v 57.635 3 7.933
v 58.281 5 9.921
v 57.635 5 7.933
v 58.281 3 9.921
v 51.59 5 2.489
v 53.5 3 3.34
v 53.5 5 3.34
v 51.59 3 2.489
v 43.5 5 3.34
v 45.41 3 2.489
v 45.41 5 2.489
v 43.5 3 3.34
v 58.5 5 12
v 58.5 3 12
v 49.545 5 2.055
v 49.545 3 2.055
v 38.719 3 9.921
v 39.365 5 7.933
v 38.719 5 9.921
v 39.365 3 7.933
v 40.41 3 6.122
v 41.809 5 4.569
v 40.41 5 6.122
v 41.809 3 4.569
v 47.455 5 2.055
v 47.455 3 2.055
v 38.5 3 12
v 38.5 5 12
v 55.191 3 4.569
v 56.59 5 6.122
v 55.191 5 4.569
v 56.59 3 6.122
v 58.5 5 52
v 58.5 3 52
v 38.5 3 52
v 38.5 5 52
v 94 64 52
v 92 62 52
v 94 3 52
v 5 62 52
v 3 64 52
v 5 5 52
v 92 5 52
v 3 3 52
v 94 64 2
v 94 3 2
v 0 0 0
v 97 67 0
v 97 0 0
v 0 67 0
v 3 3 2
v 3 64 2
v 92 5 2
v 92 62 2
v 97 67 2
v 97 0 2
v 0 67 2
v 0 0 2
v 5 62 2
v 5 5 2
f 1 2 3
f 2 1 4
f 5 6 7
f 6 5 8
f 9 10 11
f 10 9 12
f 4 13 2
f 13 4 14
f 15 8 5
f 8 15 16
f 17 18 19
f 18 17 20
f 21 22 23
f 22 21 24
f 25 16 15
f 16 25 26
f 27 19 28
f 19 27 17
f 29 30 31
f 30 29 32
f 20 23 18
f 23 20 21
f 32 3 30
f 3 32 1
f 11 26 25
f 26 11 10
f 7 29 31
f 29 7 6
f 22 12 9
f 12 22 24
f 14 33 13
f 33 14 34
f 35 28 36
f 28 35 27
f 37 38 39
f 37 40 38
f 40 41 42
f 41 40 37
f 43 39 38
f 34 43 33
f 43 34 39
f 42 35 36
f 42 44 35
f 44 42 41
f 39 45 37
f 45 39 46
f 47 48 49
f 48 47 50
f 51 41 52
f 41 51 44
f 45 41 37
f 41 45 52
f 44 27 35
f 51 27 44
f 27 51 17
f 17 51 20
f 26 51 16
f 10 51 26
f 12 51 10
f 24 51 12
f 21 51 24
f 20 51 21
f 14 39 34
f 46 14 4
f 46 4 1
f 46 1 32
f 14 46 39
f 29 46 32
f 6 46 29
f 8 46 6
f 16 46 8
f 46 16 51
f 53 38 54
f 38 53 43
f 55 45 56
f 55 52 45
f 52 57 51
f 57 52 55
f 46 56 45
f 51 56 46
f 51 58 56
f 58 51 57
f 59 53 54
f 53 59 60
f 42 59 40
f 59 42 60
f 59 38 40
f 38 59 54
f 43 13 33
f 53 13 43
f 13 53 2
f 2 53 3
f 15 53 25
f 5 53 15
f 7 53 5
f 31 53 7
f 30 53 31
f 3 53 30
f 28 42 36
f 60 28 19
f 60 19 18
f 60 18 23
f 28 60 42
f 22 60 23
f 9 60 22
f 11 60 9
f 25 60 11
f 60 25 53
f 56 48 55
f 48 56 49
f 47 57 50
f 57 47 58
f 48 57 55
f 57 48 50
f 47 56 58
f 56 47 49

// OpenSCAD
thickness = 2;

paper_width = 57;
paper_length = 87;

box_height = 50;

slit = true;
slit_width = 20;

base_width = 67;
base_length = 97;
base_height = 2;

box_length = paper_length + thickness * 2; 
box_width = paper_width + thickness * 2;

module slit(){
	translate([0, slit_width/2, 0]) cylinder(d=slit_width, h=thickness*3, center=false);
	translate([-slit_width/2, slit_width/2, 0]) cube([slit_width, box_height-slit_width/2, thickness*3]);
}

module base(){
	cube([base_length, base_width, base_height]);
}

module container(){
	difference(){
		cube([box_length, box_width, box_height + thickness]);
		translate([thickness, thickness, thickness]) cube([paper_length, paper_width, box_height]);
		if (slit){
			rotate([90, 0, 0]) translate([(box_length/2), base_height, -(base_width - box_width)/2]) slit();
		}
	}
}
base();
translate([(base_length - box_length)/2, (base_width - box_width)/2, 0]) container();
